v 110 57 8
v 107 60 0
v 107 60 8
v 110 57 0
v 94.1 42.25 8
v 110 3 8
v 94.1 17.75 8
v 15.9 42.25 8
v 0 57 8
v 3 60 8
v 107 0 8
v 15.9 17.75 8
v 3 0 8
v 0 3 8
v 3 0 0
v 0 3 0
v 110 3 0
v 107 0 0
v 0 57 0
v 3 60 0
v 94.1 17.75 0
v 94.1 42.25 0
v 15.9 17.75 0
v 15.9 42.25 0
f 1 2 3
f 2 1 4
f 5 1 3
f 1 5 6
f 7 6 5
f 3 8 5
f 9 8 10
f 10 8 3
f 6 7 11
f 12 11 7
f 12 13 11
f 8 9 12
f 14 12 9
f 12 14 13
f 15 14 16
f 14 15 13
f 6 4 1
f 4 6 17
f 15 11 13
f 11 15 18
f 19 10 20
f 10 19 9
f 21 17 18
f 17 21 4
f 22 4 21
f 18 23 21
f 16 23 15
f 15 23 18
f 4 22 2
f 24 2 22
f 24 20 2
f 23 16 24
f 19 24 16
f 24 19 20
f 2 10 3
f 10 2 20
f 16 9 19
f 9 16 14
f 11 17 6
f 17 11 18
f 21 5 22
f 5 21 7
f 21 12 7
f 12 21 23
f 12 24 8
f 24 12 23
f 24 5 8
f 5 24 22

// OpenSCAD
$fn = 32;

// ----------------------------------------------------------------------
// Windowed plate: 1 voids, 110 x 60 x 8 mm
// ----------------------------------------------------------------------

// --- parameters (mm) ---
plate_l = 110;            // plate length, X
plate_w = 60;             // plate width, Y
plate_t = 8;              // plate thickness, Z
edge_margin = 12;         // wall from the plate edge to any window
win1_l = 78.2;            // window length
win1_w = 24.5;            // window width
depth_1 = 8;              // depth of void 1 (full thickness = through)
corner_c = 3;             // corner chamfer of the plate

profile = [[3, 0], [107, 0], [110, 3], [110, 57], [107, 60], [3, 60], [0, 57], [0, 3]];  // primary outline, 8 points, counter clockwise
void_1 = [[15.9, 17.75], [94.1, 17.75], [94.1, 42.25], [15.9, 42.25]];  // large central window, 4 points

// --- the one profile operation ---
difference() {
  linear_extrude(height = plate_t) polygon(points = profile);
  translate([0, 0, -1])
    linear_extrude(height = plate_t + 2) polygon(points = void_1);
}
